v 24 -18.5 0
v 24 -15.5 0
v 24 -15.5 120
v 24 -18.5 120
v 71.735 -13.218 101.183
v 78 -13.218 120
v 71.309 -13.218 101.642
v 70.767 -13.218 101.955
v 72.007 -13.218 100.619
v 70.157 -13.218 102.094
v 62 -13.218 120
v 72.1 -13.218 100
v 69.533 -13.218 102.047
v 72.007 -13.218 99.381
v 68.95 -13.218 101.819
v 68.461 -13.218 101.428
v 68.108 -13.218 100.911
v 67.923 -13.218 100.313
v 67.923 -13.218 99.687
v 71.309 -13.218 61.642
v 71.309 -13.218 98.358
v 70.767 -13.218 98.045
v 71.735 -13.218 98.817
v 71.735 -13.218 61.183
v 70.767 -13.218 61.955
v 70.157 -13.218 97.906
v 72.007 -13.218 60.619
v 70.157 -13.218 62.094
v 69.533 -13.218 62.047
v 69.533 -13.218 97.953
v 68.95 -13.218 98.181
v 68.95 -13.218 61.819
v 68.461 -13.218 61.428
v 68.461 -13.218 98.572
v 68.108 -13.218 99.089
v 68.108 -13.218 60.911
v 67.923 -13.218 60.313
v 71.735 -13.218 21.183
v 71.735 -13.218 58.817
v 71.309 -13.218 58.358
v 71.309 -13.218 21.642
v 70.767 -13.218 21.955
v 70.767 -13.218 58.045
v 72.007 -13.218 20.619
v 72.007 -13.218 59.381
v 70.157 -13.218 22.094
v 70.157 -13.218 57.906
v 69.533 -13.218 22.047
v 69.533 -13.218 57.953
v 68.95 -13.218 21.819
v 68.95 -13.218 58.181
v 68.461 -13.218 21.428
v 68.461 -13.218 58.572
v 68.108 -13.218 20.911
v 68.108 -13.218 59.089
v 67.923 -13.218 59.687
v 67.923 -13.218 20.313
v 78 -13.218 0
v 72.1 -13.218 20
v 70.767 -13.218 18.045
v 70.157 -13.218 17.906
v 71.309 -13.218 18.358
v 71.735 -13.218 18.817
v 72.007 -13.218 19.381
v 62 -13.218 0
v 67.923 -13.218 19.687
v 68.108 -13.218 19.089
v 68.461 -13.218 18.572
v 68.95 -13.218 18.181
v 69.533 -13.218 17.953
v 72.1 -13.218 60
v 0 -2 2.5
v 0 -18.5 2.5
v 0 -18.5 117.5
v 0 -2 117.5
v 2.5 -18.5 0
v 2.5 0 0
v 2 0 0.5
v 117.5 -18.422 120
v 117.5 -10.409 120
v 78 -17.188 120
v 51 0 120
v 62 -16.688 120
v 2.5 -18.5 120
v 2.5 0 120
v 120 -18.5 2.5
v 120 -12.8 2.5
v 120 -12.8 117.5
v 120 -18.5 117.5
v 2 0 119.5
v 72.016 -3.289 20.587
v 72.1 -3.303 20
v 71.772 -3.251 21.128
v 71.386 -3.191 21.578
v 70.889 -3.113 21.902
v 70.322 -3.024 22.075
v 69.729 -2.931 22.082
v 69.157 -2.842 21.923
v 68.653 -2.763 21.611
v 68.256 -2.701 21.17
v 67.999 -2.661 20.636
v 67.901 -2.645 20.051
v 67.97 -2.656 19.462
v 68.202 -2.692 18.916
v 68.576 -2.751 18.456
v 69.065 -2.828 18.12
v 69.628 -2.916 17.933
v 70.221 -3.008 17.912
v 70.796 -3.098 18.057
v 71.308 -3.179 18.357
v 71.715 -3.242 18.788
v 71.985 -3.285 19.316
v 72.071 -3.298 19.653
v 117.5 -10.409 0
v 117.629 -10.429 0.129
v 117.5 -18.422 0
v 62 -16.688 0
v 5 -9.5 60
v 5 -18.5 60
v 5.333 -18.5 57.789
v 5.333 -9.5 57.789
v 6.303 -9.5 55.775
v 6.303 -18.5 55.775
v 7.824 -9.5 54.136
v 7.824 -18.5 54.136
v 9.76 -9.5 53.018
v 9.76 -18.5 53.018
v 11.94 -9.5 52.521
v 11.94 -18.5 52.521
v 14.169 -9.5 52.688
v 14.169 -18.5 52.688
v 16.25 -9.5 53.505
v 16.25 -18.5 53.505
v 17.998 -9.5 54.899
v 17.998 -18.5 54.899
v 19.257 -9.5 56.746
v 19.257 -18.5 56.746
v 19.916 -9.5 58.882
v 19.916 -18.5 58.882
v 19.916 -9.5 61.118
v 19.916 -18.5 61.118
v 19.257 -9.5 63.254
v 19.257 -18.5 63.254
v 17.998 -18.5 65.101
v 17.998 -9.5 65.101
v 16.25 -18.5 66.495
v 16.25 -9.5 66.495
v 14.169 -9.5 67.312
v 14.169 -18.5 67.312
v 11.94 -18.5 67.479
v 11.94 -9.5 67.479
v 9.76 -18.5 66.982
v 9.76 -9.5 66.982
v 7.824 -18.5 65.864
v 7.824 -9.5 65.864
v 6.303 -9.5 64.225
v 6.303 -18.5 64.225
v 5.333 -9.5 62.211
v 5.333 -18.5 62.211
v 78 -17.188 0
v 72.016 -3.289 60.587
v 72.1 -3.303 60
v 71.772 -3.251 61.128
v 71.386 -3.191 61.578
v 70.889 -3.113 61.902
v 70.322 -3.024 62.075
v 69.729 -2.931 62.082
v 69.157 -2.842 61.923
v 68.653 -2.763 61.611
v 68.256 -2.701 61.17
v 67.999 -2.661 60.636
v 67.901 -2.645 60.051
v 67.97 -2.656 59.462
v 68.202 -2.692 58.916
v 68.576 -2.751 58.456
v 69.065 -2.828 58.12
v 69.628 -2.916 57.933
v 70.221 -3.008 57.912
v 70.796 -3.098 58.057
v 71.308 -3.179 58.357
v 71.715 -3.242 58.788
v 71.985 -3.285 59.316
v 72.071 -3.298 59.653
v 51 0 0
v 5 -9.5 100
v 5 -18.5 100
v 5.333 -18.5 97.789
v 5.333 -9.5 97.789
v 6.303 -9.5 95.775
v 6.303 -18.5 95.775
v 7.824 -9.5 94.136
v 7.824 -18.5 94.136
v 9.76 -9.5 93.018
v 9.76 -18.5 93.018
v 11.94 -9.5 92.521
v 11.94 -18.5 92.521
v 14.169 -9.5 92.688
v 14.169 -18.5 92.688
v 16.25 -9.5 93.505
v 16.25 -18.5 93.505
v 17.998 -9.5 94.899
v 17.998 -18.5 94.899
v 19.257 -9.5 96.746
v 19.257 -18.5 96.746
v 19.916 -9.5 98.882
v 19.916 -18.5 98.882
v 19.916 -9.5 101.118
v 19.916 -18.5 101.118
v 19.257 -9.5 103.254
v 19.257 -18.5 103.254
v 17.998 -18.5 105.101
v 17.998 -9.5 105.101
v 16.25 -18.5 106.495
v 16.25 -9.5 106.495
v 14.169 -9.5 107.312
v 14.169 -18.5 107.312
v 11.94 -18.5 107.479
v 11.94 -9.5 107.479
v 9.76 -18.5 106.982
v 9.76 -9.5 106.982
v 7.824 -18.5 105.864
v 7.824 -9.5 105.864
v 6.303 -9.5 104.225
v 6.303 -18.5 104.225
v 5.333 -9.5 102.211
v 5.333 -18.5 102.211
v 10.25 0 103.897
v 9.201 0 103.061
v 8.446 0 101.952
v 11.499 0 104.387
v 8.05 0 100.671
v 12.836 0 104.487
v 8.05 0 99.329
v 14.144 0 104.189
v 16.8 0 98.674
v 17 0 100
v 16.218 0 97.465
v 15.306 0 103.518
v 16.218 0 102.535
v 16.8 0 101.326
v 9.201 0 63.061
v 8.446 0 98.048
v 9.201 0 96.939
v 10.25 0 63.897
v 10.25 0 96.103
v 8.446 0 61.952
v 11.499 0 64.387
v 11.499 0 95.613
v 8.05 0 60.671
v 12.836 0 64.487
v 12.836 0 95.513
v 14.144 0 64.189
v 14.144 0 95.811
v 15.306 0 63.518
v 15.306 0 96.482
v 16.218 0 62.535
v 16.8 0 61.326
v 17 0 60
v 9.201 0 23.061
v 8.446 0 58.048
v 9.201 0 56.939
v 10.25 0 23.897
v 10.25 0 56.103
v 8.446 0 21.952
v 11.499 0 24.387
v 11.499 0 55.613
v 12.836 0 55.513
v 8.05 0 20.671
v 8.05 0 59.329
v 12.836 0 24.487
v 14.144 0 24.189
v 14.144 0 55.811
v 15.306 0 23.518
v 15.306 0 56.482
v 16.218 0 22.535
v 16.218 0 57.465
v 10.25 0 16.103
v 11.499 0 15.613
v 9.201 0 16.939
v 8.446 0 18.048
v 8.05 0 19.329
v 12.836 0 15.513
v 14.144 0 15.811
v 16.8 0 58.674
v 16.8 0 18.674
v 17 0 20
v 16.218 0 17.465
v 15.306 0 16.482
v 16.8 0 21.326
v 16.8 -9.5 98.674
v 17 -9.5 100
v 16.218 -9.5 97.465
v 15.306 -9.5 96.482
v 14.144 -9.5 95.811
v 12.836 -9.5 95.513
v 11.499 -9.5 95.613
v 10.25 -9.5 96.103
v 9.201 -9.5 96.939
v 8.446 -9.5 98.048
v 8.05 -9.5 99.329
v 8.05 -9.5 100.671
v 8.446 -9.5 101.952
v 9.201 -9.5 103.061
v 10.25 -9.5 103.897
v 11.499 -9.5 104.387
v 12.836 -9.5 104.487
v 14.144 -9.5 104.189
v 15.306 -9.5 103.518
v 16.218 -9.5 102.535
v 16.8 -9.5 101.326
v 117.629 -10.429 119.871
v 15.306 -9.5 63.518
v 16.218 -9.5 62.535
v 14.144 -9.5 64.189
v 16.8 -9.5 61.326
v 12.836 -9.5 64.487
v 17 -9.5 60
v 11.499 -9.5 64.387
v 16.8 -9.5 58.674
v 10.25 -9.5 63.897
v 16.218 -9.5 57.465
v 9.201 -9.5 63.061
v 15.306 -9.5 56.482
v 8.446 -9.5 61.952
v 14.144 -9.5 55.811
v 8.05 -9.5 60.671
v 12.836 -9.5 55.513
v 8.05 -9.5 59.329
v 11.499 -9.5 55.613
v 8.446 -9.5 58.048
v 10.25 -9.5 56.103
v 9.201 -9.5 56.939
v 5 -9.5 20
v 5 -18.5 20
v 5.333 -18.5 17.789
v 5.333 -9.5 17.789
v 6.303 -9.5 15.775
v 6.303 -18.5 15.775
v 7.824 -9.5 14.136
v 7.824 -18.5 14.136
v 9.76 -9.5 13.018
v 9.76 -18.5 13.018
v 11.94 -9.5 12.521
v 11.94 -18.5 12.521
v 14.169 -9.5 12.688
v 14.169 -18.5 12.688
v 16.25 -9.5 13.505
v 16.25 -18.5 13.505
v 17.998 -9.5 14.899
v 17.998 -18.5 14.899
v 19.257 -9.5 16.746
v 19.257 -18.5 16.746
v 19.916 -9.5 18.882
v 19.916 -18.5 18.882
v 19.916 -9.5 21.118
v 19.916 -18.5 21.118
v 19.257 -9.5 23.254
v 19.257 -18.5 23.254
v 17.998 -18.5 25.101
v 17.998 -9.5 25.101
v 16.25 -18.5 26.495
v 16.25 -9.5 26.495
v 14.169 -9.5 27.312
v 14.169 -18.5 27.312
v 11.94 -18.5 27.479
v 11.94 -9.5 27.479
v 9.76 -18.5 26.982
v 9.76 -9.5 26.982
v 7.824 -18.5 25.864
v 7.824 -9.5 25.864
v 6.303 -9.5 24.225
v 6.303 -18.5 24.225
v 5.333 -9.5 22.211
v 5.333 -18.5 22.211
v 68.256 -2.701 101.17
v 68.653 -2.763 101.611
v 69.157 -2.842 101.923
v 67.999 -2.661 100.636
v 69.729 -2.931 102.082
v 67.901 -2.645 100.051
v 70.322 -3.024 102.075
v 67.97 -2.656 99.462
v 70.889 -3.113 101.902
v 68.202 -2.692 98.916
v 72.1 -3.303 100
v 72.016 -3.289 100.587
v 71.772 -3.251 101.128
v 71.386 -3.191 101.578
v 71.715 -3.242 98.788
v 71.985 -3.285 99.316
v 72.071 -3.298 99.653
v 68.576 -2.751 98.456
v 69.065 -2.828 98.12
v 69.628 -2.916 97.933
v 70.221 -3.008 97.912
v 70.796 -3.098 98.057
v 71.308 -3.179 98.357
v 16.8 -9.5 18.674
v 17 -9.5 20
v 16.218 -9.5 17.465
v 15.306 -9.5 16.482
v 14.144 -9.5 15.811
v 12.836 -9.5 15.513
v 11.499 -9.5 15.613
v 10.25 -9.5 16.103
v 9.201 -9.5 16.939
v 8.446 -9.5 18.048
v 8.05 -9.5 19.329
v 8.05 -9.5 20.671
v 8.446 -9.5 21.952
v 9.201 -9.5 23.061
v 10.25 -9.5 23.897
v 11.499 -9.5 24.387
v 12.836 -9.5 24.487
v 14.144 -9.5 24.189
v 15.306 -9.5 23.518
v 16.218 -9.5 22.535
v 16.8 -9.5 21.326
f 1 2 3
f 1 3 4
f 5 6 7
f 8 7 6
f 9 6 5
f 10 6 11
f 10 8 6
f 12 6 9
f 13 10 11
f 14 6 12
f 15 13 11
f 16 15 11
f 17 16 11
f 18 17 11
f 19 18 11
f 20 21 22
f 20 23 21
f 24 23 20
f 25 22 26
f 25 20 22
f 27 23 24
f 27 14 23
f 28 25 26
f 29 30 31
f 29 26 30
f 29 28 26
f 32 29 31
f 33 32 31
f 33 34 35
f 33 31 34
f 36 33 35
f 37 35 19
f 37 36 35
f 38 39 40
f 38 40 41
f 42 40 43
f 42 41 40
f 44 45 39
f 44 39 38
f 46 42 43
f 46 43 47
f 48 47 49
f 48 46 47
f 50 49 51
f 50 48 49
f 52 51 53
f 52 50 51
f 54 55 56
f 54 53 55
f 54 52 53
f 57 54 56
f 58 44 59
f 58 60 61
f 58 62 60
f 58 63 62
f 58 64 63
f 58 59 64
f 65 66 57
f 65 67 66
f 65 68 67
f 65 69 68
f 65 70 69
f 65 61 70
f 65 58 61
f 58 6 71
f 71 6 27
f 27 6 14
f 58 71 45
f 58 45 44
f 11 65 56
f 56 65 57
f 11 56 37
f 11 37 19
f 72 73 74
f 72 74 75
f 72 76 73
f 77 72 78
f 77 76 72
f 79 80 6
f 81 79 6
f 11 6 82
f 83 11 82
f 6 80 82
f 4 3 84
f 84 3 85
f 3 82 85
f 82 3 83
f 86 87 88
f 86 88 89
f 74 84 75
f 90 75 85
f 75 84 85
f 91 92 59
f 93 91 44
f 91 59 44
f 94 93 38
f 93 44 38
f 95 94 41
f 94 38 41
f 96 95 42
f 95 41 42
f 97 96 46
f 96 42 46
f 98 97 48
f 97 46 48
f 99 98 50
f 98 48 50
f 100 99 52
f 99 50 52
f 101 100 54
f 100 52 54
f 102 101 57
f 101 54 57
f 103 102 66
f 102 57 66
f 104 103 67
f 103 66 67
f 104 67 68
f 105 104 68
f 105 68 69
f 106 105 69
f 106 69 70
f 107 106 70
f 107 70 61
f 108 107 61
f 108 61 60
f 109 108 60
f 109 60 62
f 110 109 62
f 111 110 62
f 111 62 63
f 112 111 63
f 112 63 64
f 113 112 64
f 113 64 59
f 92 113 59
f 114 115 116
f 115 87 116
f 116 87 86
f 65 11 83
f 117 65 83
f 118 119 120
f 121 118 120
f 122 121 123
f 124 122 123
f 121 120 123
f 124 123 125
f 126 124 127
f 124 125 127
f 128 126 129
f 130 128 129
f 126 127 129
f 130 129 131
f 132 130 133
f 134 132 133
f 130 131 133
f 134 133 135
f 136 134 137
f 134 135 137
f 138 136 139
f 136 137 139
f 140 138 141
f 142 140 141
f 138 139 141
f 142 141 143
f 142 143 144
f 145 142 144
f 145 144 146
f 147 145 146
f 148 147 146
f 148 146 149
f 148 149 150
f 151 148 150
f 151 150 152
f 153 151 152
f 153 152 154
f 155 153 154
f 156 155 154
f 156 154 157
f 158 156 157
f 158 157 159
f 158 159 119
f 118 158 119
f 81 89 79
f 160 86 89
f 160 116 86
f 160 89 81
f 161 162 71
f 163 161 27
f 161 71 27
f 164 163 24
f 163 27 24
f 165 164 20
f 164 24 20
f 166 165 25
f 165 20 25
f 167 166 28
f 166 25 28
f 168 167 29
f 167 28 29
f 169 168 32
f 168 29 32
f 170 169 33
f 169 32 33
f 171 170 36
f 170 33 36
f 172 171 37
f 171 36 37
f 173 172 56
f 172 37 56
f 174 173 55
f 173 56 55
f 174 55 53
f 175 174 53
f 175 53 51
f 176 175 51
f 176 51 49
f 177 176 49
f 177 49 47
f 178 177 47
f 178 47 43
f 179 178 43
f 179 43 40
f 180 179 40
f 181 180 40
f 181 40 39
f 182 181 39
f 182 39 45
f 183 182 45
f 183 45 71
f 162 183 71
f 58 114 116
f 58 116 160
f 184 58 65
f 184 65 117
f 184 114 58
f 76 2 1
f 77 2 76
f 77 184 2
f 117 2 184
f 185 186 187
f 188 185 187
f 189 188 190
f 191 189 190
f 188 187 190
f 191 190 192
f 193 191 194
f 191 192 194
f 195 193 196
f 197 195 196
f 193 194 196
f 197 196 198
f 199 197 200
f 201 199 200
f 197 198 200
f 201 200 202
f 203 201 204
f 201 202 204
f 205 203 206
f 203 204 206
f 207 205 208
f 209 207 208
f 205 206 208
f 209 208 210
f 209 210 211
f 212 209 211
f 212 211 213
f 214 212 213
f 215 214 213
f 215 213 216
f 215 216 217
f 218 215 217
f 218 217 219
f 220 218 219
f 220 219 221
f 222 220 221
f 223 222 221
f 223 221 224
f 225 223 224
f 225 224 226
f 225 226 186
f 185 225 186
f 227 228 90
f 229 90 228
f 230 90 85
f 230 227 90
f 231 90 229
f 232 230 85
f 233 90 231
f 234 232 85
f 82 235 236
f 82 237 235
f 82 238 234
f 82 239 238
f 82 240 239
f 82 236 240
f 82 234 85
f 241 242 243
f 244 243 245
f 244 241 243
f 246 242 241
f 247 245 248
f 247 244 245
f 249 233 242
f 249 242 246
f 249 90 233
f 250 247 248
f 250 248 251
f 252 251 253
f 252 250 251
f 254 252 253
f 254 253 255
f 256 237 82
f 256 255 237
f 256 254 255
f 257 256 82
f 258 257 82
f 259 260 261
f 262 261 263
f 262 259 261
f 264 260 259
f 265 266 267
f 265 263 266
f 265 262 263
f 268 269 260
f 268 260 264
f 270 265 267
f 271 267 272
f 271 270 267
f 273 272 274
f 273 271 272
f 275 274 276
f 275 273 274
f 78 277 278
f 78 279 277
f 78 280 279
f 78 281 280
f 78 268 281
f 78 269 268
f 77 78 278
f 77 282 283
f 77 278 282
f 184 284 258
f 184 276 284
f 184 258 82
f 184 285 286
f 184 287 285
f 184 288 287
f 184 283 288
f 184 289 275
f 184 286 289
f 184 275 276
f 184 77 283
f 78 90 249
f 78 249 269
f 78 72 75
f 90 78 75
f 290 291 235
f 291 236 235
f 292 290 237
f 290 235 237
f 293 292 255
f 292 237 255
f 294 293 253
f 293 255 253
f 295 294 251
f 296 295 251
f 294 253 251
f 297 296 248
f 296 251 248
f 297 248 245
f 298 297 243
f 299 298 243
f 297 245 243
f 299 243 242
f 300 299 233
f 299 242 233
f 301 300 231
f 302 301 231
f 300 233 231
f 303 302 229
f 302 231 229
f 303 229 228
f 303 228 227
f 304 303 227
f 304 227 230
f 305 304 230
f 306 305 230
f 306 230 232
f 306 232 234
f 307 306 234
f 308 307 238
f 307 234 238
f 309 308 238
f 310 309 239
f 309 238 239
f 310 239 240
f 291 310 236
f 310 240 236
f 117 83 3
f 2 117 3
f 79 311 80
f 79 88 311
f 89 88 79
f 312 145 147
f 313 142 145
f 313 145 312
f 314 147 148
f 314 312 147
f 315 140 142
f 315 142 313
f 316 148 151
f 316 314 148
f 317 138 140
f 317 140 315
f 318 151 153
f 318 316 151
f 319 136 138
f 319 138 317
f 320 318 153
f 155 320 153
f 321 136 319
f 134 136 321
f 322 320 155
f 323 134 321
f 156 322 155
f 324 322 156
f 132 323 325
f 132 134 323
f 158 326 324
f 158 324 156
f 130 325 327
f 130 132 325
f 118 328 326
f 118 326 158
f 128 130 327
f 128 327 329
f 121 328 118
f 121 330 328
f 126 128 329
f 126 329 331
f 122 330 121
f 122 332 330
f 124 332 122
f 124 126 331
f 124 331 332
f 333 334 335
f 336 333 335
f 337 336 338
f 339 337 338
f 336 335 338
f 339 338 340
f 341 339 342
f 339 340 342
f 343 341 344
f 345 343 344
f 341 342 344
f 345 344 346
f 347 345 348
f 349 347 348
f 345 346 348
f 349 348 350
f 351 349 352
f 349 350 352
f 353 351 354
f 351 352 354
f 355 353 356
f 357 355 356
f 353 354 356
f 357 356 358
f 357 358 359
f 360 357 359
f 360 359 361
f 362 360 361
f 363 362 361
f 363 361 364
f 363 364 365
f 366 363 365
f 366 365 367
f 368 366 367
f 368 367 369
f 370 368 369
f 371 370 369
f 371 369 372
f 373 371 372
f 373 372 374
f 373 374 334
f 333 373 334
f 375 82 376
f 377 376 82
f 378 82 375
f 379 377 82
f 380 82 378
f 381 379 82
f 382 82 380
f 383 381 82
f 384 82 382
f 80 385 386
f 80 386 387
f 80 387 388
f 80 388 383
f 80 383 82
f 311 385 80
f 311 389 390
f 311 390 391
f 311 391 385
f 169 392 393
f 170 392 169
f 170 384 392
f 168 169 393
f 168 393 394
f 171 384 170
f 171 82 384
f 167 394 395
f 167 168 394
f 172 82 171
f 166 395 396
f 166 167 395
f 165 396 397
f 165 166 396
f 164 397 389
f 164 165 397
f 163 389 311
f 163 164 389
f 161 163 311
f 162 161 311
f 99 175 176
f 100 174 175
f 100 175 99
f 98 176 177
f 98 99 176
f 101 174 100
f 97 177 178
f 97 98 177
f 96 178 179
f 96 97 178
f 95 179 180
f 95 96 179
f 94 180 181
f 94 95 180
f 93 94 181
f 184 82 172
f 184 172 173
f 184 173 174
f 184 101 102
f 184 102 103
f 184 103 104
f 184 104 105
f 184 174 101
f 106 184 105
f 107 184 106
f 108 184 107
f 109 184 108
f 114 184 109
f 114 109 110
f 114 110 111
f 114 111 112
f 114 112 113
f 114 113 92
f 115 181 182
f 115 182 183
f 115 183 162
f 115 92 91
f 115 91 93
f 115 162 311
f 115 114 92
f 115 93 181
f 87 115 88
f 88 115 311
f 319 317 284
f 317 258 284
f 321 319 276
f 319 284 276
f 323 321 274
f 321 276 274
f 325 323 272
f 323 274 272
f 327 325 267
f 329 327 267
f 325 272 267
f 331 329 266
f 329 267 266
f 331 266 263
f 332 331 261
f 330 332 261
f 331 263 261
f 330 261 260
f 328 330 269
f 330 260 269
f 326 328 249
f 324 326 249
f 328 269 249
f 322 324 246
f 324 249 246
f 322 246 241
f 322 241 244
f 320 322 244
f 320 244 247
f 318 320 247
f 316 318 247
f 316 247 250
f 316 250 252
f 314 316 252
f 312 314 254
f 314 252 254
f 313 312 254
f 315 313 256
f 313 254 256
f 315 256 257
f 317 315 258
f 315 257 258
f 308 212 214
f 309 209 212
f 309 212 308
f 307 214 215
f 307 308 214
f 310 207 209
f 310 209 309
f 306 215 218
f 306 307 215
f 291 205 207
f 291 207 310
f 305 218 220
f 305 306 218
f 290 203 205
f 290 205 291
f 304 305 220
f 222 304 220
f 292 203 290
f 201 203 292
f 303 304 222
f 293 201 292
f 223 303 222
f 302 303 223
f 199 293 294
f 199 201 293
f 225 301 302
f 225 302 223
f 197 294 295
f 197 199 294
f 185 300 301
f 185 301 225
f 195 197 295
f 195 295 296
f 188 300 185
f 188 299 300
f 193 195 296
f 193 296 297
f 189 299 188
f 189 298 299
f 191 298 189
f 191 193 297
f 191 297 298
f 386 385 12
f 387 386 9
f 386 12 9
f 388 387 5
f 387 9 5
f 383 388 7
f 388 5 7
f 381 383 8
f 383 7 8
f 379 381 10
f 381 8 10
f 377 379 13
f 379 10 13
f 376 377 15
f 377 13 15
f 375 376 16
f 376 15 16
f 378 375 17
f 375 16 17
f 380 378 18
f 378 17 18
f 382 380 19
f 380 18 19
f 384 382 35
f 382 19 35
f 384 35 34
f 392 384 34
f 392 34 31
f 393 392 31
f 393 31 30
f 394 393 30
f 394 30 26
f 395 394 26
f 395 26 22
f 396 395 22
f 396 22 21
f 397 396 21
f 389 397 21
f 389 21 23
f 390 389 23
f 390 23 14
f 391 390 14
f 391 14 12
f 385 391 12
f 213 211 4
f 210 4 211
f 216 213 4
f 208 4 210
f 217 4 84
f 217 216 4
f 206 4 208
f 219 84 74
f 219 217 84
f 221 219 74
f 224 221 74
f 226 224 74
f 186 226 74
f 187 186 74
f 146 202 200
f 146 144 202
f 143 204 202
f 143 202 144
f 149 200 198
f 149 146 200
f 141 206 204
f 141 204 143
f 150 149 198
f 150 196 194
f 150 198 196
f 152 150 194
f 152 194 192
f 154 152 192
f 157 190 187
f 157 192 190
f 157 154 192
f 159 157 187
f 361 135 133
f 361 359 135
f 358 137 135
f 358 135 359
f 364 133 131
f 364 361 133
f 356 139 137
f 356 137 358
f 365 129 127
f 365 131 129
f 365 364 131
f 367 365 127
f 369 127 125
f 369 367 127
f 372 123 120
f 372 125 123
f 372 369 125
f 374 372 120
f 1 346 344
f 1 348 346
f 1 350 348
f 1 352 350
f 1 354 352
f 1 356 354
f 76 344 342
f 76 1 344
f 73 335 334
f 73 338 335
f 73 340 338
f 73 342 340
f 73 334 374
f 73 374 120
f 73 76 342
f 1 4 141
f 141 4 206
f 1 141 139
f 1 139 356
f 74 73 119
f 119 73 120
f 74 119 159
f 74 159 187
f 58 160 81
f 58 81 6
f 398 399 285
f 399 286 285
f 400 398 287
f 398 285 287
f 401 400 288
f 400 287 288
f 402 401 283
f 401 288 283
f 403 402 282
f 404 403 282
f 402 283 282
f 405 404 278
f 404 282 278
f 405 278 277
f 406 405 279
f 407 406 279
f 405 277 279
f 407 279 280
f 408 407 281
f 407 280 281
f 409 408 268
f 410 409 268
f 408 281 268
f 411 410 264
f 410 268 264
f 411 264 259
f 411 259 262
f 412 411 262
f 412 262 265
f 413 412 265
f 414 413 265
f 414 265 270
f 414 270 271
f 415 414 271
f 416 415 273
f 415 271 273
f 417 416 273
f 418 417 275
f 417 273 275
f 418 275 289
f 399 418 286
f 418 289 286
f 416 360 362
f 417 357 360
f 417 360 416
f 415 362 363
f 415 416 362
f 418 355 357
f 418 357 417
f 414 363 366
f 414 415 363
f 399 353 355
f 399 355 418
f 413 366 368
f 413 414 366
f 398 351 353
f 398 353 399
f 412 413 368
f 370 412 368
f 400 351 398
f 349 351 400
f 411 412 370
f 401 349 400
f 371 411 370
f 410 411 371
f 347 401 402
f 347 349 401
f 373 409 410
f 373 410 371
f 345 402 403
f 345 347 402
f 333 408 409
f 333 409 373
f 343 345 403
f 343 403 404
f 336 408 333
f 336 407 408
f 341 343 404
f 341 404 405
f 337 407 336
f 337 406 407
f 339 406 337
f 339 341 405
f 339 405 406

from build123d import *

# Parameters (mm, degrees)
EXTRUDE_1_DEPTH           = 120
HOLE_WIZARD_1_D           = 9
HOLE_WIZARD_1_CBORE_D     = 15
HOLE_WIZARD_1_CBORE_DEPTH = 9
CUT_EXTRUDE_1_REACH       = 172.22
SKETCH_6_R                = 2.1
CHAMFER_2_SIZE            = 2.5
CHAMFER_3_SIZE            = 2
CHAMFER_3_SIZE2           = 2.400003543
CHAMFER_4_SIZE            = 2


with BuildPart() as part:
    # 草图1 → 凸台-拉伸1 (new body)
    with BuildSketch(Plane.XY):
        Polygon((0, 0), (51, 0), (120, -10.8), (120, -18.5), (78, -17.1875), (78, -13.2175), (62, -13.2175), (62, -16.6875), (24, -15.5), (24, -18.5), (0, -18.5), align=None)
    extrude(amount=EXTRUDE_1_DEPTH)

    # 孔1 (through all)
    with Locations(Plane(origin=(0, -18.5, 0), x_dir=(-1, 0, 0), z_dir=(0, -1, 0))):
        with Locations((-12.5, -20), (-12.5, -60), (-12.5, -100)):
            CounterBoreHole(HOLE_WIZARD_1_D / 2, HOLE_WIZARD_1_CBORE_D / 2, HOLE_WIZARD_1_CBORE_DEPTH)

    # 切除-拉伸1: up to this plane
    cut_extrude_1_end = Plane(origin=(51, 0, 120), z_dir=(-0.15463894699101186, -0.9879710502203549, 0))
    # 草图6 → 切除-拉伸1 (cut, up to the surface)
    with BuildSketch(Plane.XZ.offset(13.2175), mode=Mode.PRIVATE) as cut_extrude_1_sk1:
        with Locations((70, 100)):
            Circle(SKETCH_6_R)
    cut_extrude_1_tool1 = split(extrude(cut_extrude_1_sk1.sketch, amount=-CUT_EXTRUDE_1_REACH, mode=Mode.PRIVATE), bisect_by=cut_extrude_1_end, keep=Keep.BOTH, mode=Mode.PRIVATE)
    add(cut_extrude_1_tool1.solids().sort_by_distance((70, -13.2175, 100))[0], mode=Mode.SUBTRACT)
    # 草图6 → 切除-拉伸1 (cut, up to the surface)
    with BuildSketch(Plane.XZ.offset(13.2175), mode=Mode.PRIVATE) as cut_extrude_1_sk2:
        with Locations((70, 60)):
            Circle(SKETCH_6_R)
    cut_extrude_1_tool2 = split(extrude(cut_extrude_1_sk2.sketch, amount=-CUT_EXTRUDE_1_REACH, mode=Mode.PRIVATE), bisect_by=cut_extrude_1_end, keep=Keep.BOTH, mode=Mode.PRIVATE)
    add(cut_extrude_1_tool2.solids().sort_by_distance((70, -13.2175, 60))[0], mode=Mode.SUBTRACT)
    # 草图6 → 切除-拉伸1 (cut, up to the surface)
    with BuildSketch(Plane.XZ.offset(13.2175), mode=Mode.PRIVATE) as cut_extrude_1_sk3:
        with Locations((70, 20)):
            Circle(SKETCH_6_R)
    cut_extrude_1_tool3 = split(extrude(cut_extrude_1_sk3.sketch, amount=-CUT_EXTRUDE_1_REACH, mode=Mode.PRIVATE), bisect_by=cut_extrude_1_end, keep=Keep.BOTH, mode=Mode.PRIVATE)
    add(cut_extrude_1_tool3.solids().sort_by_distance((70, -13.2175, 20))[0], mode=Mode.SUBTRACT)

    # 倒角2
    chamfer_2_edges = [part.edges().sort_by_distance(p)[0] for p in [
        (120, -14.65, 0),
        (0, -9.25, 0),
        (120, -14.65, 120),
        (0, -9.25, 120),
    ]]
    chamfer(chamfer_2_edges, length=CHAMFER_2_SIZE)

    # 倒角3
    chamfer_3_edges = [part.edges().sort_by_distance(p)[0] for p in [
        (120, -10.8, 60),
    ]]
    chamfer_3_side = [part.faces().sort_by_distance(p)[0] for p in [
        (120, -14.65, 60),
    ]]
    chamfer(chamfer_3_edges, length=CHAMFER_3_SIZE, length2=CHAMFER_3_SIZE2, reference=chamfer_3_side[0])

    # 倒角4
    chamfer_4_edges = [part.edges().sort_by_distance(p)[0] for p in [
        (0, 0, 60),
    ]]
    chamfer(chamfer_4_edges, length=CHAMFER_4_SIZE)


solid = part.part
